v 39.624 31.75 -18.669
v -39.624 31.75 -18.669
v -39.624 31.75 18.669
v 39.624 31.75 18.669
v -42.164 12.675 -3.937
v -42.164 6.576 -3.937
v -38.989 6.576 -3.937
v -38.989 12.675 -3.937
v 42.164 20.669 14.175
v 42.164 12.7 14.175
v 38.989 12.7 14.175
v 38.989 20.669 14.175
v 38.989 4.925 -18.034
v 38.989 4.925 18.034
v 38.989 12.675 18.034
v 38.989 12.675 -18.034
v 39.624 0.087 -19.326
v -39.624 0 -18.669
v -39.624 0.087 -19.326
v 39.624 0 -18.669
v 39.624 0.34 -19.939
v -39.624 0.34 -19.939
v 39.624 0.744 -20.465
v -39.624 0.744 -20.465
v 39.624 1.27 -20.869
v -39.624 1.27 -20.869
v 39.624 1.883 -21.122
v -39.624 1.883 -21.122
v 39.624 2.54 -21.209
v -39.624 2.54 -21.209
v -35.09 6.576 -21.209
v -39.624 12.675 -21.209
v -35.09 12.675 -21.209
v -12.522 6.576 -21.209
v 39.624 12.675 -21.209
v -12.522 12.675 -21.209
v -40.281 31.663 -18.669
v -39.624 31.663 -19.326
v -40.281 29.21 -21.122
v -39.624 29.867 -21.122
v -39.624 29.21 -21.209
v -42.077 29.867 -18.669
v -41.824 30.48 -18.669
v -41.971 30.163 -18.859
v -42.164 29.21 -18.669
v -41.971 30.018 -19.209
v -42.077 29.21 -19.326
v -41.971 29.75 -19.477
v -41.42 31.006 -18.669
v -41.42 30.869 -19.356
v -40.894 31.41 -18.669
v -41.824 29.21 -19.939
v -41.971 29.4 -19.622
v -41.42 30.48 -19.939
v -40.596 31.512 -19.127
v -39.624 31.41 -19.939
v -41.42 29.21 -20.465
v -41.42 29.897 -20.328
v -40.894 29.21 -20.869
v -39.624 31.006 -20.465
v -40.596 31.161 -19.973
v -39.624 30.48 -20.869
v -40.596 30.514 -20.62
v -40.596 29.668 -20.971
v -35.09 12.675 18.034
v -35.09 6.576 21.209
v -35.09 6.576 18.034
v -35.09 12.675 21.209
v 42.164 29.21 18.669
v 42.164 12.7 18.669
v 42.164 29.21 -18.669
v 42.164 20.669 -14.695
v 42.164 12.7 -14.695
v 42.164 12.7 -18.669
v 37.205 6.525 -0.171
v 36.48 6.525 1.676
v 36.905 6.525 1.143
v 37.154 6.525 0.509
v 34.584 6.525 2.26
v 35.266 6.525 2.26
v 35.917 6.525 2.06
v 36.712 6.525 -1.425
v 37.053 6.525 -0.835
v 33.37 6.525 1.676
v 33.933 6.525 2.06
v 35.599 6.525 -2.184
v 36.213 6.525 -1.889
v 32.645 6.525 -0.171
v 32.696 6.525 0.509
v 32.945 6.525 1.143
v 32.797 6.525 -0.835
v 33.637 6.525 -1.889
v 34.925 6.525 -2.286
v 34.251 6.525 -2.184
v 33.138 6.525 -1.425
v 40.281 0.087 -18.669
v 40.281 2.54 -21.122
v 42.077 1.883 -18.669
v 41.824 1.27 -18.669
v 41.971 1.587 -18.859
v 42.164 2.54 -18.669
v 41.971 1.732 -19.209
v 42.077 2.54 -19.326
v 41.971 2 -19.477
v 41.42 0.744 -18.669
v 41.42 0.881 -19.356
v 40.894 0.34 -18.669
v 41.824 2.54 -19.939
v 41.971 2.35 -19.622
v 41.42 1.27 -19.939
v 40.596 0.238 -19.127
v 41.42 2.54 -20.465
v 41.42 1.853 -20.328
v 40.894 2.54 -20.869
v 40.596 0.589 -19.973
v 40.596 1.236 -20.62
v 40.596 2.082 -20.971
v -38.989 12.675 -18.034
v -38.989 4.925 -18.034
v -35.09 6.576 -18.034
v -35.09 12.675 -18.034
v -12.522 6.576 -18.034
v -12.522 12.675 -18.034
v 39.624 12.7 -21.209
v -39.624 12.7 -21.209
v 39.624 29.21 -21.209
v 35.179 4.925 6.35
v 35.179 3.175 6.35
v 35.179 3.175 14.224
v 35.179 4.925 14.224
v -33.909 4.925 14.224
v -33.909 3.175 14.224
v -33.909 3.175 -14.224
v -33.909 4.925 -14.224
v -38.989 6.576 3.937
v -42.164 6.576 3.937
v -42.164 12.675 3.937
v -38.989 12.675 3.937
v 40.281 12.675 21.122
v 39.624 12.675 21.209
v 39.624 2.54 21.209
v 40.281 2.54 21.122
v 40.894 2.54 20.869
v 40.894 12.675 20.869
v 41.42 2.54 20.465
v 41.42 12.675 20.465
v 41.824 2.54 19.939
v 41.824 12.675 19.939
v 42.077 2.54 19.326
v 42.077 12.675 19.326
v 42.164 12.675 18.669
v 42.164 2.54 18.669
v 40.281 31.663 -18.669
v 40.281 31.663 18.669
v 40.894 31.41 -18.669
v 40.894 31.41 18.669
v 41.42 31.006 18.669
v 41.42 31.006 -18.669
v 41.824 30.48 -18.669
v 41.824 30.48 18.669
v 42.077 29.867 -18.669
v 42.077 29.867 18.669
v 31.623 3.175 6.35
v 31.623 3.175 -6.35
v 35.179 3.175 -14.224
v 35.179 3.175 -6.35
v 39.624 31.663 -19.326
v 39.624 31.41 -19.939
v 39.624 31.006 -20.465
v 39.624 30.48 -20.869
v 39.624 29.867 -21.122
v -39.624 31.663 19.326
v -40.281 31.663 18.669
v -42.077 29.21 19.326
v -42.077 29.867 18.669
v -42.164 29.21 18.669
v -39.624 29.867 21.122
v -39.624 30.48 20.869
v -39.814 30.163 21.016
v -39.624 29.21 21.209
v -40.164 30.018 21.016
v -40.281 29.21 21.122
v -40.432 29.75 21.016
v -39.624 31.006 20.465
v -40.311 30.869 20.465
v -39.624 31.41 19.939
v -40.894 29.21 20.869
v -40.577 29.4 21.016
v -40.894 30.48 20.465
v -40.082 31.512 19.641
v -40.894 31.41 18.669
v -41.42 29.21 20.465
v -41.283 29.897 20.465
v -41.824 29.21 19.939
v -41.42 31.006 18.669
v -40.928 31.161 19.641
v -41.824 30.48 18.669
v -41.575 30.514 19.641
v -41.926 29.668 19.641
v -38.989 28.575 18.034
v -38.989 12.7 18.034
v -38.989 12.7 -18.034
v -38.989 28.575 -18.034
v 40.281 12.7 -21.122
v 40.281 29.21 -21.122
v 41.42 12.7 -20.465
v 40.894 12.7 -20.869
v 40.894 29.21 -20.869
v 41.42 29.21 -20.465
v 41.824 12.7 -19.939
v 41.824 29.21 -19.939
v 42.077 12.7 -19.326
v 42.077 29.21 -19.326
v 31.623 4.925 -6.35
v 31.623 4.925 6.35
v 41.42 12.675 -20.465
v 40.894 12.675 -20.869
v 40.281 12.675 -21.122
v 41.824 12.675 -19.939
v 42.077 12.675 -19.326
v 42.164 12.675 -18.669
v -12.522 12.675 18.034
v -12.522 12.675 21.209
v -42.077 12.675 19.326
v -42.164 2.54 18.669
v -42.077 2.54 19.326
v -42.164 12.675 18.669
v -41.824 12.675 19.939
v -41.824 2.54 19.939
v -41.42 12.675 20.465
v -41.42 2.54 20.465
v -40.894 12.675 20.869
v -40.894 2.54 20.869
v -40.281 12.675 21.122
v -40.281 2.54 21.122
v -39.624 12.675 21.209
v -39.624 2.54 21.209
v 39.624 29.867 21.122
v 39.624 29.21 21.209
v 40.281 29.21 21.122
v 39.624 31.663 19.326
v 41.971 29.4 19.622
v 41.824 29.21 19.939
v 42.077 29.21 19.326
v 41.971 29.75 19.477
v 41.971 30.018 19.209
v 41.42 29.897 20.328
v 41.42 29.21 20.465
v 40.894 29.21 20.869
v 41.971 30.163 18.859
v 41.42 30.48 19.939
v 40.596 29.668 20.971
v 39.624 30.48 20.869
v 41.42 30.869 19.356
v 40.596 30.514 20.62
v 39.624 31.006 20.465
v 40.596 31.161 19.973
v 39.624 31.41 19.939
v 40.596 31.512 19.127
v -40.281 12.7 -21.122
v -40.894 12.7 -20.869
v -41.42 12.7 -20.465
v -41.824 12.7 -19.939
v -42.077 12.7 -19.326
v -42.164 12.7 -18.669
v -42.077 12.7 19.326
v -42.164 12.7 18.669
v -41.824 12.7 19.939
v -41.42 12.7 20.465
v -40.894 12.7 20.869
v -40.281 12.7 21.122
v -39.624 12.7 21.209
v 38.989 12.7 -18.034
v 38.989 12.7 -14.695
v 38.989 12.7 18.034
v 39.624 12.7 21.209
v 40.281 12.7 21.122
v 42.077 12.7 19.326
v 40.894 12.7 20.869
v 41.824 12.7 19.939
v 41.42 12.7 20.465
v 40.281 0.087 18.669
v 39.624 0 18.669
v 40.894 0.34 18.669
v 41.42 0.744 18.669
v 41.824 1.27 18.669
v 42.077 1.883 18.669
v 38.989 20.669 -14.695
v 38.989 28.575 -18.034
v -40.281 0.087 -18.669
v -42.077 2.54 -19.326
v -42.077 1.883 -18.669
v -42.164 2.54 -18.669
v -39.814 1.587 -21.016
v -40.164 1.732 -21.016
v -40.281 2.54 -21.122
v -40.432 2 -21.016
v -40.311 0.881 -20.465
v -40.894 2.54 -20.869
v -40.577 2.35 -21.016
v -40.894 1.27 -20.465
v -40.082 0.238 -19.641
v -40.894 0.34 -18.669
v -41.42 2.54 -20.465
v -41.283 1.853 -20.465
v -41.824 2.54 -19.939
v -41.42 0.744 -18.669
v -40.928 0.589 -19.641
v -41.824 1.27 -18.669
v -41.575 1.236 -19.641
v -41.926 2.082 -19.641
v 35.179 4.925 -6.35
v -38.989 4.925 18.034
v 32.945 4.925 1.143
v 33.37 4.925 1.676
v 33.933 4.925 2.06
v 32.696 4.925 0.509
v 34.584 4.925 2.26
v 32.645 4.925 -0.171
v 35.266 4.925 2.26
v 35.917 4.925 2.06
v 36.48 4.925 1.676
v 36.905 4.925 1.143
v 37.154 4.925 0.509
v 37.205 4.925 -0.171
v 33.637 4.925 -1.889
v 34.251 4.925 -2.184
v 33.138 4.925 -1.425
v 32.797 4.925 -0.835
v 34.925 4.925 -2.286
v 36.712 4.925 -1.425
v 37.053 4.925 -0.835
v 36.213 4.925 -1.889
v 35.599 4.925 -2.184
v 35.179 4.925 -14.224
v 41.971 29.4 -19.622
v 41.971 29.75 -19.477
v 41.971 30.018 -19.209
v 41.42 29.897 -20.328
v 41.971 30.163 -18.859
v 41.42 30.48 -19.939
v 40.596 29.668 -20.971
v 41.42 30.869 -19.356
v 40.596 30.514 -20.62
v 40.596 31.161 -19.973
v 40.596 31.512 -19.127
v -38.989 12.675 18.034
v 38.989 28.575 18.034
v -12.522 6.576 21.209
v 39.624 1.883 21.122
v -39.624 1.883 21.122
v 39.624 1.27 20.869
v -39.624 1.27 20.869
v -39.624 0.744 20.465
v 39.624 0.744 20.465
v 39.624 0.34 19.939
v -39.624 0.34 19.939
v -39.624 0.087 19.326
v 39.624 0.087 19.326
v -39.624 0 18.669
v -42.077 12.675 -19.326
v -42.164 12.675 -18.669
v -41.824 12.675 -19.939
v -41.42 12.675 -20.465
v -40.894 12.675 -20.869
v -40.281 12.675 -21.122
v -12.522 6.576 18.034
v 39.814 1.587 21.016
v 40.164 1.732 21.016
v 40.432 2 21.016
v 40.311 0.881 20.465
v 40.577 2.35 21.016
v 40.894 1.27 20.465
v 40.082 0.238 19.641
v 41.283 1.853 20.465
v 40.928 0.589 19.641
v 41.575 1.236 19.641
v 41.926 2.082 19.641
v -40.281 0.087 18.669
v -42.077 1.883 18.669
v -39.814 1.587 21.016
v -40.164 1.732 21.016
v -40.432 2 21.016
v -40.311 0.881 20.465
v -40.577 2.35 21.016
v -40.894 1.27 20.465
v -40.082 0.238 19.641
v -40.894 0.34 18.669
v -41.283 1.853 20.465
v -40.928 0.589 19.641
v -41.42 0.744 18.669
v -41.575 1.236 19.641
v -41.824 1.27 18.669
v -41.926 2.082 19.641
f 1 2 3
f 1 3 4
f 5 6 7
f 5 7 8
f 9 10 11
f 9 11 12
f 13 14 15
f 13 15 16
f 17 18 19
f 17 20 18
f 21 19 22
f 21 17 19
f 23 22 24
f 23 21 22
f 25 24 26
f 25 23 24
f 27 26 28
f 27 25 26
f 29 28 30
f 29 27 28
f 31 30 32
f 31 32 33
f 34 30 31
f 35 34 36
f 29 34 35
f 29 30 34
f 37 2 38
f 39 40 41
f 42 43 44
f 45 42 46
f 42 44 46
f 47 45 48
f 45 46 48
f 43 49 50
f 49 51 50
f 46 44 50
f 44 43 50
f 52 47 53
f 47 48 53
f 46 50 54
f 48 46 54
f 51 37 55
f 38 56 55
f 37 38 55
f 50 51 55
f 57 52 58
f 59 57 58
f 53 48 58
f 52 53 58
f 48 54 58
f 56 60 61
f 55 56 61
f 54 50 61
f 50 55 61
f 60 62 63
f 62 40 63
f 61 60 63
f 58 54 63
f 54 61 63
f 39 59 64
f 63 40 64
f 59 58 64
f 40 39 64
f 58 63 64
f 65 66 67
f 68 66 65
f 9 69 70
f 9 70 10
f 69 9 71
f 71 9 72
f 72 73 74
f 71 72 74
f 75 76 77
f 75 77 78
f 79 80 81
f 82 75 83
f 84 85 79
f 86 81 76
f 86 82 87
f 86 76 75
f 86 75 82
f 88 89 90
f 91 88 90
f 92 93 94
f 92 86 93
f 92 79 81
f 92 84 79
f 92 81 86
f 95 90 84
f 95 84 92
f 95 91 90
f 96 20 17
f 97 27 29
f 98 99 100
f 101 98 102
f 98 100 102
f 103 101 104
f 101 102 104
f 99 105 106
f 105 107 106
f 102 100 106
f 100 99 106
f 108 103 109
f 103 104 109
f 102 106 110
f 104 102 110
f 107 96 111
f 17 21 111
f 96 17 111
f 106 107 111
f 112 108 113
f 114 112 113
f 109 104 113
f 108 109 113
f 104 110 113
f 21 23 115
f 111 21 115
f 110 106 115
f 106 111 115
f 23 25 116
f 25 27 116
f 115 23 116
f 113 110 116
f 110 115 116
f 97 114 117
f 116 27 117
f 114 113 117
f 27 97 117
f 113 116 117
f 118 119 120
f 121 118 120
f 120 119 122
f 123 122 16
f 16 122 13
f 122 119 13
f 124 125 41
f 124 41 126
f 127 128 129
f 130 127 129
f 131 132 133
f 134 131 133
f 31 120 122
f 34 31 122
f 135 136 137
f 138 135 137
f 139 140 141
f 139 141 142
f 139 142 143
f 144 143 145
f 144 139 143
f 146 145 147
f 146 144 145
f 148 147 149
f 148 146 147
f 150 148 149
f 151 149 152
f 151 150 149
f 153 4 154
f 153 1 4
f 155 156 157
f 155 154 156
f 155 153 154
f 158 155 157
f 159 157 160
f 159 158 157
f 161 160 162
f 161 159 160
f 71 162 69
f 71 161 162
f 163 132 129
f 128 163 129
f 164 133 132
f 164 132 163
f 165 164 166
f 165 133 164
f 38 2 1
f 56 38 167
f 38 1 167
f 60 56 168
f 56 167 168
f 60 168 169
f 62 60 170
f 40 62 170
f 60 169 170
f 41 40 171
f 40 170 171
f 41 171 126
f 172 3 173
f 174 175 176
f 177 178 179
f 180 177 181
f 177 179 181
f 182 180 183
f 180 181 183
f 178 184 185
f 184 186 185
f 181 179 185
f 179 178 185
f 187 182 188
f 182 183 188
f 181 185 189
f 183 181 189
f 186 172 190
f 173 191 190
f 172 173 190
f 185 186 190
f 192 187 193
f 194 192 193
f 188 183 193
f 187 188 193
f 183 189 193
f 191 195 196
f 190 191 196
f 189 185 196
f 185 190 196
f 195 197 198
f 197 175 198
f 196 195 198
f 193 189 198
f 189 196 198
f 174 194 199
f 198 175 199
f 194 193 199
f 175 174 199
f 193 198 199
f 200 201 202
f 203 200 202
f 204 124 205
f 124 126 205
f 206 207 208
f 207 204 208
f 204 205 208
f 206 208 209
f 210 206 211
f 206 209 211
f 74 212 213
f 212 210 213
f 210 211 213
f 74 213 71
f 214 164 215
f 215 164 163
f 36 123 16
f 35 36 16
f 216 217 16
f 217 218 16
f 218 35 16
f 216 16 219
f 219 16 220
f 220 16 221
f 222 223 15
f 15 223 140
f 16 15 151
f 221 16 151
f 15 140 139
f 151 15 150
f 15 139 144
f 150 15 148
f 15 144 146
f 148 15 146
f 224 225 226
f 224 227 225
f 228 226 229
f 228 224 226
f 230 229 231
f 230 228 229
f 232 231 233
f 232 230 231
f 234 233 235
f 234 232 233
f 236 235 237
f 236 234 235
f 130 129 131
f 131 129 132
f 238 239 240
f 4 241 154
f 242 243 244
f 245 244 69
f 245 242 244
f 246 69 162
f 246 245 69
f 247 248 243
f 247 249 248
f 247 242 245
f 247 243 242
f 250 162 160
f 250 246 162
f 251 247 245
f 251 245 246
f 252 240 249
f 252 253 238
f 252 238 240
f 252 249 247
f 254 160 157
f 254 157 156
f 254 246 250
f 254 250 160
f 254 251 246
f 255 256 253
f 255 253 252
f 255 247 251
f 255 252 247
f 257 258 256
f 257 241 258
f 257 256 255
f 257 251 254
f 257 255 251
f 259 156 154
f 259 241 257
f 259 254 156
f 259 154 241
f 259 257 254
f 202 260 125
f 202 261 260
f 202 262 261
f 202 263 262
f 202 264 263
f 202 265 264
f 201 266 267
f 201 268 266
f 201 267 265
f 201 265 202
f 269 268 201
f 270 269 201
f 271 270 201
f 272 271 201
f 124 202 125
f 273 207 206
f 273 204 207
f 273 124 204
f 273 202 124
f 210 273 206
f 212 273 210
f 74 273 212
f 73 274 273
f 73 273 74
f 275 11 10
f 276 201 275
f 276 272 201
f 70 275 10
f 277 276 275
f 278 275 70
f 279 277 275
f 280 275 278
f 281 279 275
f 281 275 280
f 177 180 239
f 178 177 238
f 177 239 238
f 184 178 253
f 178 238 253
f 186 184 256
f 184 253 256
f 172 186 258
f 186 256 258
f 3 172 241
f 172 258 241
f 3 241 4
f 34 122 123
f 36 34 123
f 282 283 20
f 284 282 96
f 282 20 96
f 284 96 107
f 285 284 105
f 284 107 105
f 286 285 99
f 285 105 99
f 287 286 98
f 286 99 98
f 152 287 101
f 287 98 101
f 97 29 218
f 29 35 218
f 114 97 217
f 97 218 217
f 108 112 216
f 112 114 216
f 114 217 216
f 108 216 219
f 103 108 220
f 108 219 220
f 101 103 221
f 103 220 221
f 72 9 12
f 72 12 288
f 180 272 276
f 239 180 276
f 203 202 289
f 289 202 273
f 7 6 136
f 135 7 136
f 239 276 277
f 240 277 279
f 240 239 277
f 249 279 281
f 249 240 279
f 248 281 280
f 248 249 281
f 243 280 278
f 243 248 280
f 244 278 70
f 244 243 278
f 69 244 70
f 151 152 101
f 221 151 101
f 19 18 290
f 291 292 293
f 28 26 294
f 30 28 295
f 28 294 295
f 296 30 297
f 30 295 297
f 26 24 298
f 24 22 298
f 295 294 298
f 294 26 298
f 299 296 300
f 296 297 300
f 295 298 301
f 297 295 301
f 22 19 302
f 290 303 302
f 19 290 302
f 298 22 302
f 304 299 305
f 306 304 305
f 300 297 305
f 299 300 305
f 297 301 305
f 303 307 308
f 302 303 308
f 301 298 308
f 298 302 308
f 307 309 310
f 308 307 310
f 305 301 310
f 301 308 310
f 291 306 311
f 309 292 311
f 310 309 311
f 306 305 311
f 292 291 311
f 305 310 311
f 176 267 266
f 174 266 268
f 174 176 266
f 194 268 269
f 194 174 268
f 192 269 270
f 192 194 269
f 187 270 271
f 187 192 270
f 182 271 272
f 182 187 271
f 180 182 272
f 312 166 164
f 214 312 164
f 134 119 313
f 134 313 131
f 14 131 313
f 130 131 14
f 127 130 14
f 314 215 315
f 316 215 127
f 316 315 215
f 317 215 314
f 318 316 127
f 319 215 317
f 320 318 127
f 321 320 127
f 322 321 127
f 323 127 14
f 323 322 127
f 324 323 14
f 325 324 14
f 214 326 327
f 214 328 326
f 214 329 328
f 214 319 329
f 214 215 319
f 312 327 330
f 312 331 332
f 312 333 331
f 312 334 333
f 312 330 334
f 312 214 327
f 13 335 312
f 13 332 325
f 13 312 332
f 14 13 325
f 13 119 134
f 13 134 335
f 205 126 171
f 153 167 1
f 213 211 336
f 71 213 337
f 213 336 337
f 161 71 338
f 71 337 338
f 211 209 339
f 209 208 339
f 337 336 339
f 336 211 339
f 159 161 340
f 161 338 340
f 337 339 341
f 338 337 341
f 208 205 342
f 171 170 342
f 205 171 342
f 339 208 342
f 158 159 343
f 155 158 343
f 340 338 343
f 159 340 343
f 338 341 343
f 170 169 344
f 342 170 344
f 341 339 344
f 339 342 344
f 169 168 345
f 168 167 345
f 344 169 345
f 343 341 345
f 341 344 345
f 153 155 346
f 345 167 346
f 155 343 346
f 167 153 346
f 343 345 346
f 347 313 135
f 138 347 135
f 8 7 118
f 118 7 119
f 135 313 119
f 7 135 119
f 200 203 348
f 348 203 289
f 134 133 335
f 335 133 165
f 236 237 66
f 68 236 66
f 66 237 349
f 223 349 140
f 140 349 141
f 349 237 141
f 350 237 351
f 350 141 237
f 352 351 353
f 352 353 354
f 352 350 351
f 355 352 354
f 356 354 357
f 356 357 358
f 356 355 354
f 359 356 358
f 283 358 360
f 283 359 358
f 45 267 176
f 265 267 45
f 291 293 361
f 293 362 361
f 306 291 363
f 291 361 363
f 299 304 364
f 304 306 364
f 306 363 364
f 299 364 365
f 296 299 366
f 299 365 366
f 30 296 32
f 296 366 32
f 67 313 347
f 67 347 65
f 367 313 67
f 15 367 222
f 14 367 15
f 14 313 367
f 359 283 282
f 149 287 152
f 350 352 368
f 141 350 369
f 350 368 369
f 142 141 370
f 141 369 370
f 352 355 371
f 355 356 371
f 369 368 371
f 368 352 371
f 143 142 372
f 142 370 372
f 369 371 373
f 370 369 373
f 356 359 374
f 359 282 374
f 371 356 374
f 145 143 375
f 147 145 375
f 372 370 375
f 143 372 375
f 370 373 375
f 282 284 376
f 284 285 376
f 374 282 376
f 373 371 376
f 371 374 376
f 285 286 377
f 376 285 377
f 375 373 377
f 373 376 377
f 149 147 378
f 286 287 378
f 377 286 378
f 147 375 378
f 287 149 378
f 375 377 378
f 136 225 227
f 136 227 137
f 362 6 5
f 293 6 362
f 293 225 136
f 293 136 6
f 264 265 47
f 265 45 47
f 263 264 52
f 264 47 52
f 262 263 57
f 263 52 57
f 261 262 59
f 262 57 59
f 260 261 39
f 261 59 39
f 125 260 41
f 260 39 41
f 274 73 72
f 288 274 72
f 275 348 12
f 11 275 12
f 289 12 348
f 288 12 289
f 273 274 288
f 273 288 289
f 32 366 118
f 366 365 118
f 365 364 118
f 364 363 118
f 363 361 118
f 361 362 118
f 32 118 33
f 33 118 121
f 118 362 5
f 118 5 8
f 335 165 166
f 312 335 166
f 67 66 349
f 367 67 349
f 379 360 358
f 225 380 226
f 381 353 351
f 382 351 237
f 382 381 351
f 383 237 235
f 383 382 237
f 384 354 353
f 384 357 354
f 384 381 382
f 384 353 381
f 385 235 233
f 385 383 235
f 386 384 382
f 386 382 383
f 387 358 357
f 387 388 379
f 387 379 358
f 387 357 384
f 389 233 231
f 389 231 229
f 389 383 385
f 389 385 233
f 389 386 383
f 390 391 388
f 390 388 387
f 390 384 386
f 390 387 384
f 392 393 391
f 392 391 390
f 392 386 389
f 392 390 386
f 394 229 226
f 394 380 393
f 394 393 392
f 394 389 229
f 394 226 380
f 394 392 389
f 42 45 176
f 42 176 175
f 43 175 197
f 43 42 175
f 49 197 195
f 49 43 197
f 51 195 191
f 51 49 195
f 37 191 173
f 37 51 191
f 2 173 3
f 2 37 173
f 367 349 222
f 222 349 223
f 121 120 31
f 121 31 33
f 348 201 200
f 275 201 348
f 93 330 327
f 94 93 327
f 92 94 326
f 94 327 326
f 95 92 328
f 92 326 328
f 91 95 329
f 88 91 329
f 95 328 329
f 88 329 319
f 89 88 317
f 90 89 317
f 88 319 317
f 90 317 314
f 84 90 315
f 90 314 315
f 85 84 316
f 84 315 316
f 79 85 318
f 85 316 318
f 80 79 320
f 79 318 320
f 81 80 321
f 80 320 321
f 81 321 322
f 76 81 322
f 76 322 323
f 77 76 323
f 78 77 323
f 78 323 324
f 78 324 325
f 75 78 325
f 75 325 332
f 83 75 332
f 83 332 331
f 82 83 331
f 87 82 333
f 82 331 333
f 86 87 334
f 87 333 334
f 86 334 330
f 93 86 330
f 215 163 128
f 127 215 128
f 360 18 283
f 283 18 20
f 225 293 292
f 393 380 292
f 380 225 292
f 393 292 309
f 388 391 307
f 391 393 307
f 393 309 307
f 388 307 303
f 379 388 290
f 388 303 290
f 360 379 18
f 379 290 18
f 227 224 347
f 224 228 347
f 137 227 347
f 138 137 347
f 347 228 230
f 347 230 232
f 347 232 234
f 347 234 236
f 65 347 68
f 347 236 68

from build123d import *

# Parameters (mm, degrees)
SKETCH1_W           = 84.328
SKETCH1_H           = 42.418
BOSS_EXTRUDE1_DEPTH = 31.75
SKETCH2_W           = 22.5679
SKETCH2_H           = 6.09854
CUT_EXTRUDE1_DEPTH  = 68.713751336
SHELL1_T            = -3.175
CUT_EXTRUDE3_REACH  = 94.569
SKETCH4_W           = 7.874
SKETCH4_H           = 6.09854
FILLET1_R           = 2.54
SKETCH5_W           = 89.038189856
SKETCH5_H           = 0.0254
CUT_EXTRUDE4_DEPTH  = 68.713751336
SKETCH6_W           = 77.978
SKETCH6_H           = 36.068
BOSS_EXTRUDE2_DEPTH = 1.75006
SKETCH7_R           = 2.286
BOSS_EXTRUDE3_DEPTH = 1.6002
SKETCH9_W           = 28.870221249
SKETCH9_H           = 7.968851024
CUT_EXTRUDE5_DEPTH  = 3.175


with BuildPart() as part:
    # Sketch1 → Boss-Extrude1 (new body)
    with BuildSketch(Plane(origin=(0, 0, 0), x_dir=(1, 0, 0), z_dir=(0, 1, 0))):
        Rectangle(SKETCH1_W, SKETCH1_H)
    extrude(amount=BOSS_EXTRUDE1_DEPTH)

    # Sketch2 → Cut-Extrude1 (cut, through all)
    with BuildSketch(Plane.XY.offset(21.209)):
        with Locations((-23.80615, 9.62533)):
            Rectangle(SKETCH2_W, SKETCH2_H)
    extrude(amount=-CUT_EXTRUDE1_DEPTH, mode=Mode.SUBTRACT)

    # Shell1
    shell1_openings = [part.faces().sort_by_distance(p)[0] for p in [
        (-35.0901, 9.62533, 0),
        (-23.80615, 12.6746, 0),
        (-12.5222, 9.62533, 0),
        (-23.80615, 6.57606, 0),
    ]]
    offset(amount=SHELL1_T, openings=shell1_openings, kind=Kind.INTERSECTION)

    # Sketch4 → Cut-Extrude3 (cut, up to next)
    with BuildSketch(Plane.ZY.offset(42.164), mode=Mode.PRIVATE) as cut_extrude3_sk1:
        with Locations((0, 9.62533)):
            Rectangle(SKETCH4_W, SKETCH4_H)
    cut_extrude3_tool1 = extrude(cut_extrude3_sk1.sketch, amount=-CUT_EXTRUDE3_REACH, mode=Mode.PRIVATE) & part.part
    add(cut_extrude3_tool1.solids().sort_by_distance((-42.164, 9.62533, 0))[0], mode=Mode.SUBTRACT)

    # Fillet1
    fillet1_edges = [part.edges().sort_by_distance(p)[0] for p in [
        (0, 31.75, -21.209),
        (-42.164, 31.75, 0),
        (0, 31.75, 21.209),
        (-42.164, 0, 0),
        (0, 0, -21.209),
        (42.164, 0, 0),
        (0, 0, 21.209),
        (-42.164, 15.875, 21.209),
        (-42.164, 15.875, -21.209),
        (42.164, 15.875, -21.209),
        (42.164, 15.875, 21.209),
        (42.164, 31.75, 0),
    ]]
    fillet(fillet1_edges, radius=FILLET1_R)

    # Sketch5 → Cut-Extrude4 (cut, through all)
    with BuildSketch(Plane.XY.offset(21.209)):
        with Locations((0.216743403, 12.6873)):
            Rectangle(SKETCH5_W, SKETCH5_H)
    extrude(amount=-CUT_EXTRUDE4_DEPTH, mode=Mode.SUBTRACT)


with BuildPart() as cut_extrude4_piece_1:
    # of the separate pieces the step leaves, piece 1, a body of its own (cut_extrude4_pieces)
    add(part.part.solids().sort_by_distance((-39.624, 12.7, 21.209))[0])

    # Sketch9 → Cut-Extrude5 (cut)
    with BuildSketch(Plane(origin=(42.164, 0, 0), x_dir=(0, 0, -1), z_dir=(1, 0, 0))):
        with Locations((0.260092084, 16.684425512)):
            Rectangle(SKETCH9_W, SKETCH9_H)
    extrude(amount=-CUT_EXTRUDE5_DEPTH, mode=Mode.SUBTRACT)


with BuildPart() as cut_extrude4_piece_2:
    # of the separate pieces the step leaves, piece 2, a body of its own (cut_extrude4_pieces)
    add(part.part.solids().sort_by_distance((-39.624, 2.54, 21.209))[0])

    # Sketch6 → Boss-Extrude2 (add)
    with BuildSketch(Plane(origin=(0, 3.175, 0), x_dir=(1, 0, 0), z_dir=(0, 1, 0))):
        Rectangle(SKETCH6_W, SKETCH6_H)
        Polygon((-33.909, -14.224), (-33.909, 14.224), (35.179, 14.224), (35.179, 6.35), (31.623, 6.35), (31.623, -6.35), (35.179, -6.35), (35.179, -14.224), align=None, mode=Mode.SUBTRACT)
    extrude(amount=BOSS_EXTRUDE2_DEPTH)

    # Sketch7 → Boss-Extrude3 (add)
    with BuildSketch(Plane(origin=(0, 4.92506, 0), x_dir=(1, 0, 0), z_dir=(0, 1, 0))):
        with Locations(Location((34.925, 0, 0), (0, 0, 90))):
            Circle(SKETCH7_R)
    extrude(amount=BOSS_EXTRUDE3_DEPTH)


solid = Compound([cut_extrude4_piece_1.part, cut_extrude4_piece_2.part])
